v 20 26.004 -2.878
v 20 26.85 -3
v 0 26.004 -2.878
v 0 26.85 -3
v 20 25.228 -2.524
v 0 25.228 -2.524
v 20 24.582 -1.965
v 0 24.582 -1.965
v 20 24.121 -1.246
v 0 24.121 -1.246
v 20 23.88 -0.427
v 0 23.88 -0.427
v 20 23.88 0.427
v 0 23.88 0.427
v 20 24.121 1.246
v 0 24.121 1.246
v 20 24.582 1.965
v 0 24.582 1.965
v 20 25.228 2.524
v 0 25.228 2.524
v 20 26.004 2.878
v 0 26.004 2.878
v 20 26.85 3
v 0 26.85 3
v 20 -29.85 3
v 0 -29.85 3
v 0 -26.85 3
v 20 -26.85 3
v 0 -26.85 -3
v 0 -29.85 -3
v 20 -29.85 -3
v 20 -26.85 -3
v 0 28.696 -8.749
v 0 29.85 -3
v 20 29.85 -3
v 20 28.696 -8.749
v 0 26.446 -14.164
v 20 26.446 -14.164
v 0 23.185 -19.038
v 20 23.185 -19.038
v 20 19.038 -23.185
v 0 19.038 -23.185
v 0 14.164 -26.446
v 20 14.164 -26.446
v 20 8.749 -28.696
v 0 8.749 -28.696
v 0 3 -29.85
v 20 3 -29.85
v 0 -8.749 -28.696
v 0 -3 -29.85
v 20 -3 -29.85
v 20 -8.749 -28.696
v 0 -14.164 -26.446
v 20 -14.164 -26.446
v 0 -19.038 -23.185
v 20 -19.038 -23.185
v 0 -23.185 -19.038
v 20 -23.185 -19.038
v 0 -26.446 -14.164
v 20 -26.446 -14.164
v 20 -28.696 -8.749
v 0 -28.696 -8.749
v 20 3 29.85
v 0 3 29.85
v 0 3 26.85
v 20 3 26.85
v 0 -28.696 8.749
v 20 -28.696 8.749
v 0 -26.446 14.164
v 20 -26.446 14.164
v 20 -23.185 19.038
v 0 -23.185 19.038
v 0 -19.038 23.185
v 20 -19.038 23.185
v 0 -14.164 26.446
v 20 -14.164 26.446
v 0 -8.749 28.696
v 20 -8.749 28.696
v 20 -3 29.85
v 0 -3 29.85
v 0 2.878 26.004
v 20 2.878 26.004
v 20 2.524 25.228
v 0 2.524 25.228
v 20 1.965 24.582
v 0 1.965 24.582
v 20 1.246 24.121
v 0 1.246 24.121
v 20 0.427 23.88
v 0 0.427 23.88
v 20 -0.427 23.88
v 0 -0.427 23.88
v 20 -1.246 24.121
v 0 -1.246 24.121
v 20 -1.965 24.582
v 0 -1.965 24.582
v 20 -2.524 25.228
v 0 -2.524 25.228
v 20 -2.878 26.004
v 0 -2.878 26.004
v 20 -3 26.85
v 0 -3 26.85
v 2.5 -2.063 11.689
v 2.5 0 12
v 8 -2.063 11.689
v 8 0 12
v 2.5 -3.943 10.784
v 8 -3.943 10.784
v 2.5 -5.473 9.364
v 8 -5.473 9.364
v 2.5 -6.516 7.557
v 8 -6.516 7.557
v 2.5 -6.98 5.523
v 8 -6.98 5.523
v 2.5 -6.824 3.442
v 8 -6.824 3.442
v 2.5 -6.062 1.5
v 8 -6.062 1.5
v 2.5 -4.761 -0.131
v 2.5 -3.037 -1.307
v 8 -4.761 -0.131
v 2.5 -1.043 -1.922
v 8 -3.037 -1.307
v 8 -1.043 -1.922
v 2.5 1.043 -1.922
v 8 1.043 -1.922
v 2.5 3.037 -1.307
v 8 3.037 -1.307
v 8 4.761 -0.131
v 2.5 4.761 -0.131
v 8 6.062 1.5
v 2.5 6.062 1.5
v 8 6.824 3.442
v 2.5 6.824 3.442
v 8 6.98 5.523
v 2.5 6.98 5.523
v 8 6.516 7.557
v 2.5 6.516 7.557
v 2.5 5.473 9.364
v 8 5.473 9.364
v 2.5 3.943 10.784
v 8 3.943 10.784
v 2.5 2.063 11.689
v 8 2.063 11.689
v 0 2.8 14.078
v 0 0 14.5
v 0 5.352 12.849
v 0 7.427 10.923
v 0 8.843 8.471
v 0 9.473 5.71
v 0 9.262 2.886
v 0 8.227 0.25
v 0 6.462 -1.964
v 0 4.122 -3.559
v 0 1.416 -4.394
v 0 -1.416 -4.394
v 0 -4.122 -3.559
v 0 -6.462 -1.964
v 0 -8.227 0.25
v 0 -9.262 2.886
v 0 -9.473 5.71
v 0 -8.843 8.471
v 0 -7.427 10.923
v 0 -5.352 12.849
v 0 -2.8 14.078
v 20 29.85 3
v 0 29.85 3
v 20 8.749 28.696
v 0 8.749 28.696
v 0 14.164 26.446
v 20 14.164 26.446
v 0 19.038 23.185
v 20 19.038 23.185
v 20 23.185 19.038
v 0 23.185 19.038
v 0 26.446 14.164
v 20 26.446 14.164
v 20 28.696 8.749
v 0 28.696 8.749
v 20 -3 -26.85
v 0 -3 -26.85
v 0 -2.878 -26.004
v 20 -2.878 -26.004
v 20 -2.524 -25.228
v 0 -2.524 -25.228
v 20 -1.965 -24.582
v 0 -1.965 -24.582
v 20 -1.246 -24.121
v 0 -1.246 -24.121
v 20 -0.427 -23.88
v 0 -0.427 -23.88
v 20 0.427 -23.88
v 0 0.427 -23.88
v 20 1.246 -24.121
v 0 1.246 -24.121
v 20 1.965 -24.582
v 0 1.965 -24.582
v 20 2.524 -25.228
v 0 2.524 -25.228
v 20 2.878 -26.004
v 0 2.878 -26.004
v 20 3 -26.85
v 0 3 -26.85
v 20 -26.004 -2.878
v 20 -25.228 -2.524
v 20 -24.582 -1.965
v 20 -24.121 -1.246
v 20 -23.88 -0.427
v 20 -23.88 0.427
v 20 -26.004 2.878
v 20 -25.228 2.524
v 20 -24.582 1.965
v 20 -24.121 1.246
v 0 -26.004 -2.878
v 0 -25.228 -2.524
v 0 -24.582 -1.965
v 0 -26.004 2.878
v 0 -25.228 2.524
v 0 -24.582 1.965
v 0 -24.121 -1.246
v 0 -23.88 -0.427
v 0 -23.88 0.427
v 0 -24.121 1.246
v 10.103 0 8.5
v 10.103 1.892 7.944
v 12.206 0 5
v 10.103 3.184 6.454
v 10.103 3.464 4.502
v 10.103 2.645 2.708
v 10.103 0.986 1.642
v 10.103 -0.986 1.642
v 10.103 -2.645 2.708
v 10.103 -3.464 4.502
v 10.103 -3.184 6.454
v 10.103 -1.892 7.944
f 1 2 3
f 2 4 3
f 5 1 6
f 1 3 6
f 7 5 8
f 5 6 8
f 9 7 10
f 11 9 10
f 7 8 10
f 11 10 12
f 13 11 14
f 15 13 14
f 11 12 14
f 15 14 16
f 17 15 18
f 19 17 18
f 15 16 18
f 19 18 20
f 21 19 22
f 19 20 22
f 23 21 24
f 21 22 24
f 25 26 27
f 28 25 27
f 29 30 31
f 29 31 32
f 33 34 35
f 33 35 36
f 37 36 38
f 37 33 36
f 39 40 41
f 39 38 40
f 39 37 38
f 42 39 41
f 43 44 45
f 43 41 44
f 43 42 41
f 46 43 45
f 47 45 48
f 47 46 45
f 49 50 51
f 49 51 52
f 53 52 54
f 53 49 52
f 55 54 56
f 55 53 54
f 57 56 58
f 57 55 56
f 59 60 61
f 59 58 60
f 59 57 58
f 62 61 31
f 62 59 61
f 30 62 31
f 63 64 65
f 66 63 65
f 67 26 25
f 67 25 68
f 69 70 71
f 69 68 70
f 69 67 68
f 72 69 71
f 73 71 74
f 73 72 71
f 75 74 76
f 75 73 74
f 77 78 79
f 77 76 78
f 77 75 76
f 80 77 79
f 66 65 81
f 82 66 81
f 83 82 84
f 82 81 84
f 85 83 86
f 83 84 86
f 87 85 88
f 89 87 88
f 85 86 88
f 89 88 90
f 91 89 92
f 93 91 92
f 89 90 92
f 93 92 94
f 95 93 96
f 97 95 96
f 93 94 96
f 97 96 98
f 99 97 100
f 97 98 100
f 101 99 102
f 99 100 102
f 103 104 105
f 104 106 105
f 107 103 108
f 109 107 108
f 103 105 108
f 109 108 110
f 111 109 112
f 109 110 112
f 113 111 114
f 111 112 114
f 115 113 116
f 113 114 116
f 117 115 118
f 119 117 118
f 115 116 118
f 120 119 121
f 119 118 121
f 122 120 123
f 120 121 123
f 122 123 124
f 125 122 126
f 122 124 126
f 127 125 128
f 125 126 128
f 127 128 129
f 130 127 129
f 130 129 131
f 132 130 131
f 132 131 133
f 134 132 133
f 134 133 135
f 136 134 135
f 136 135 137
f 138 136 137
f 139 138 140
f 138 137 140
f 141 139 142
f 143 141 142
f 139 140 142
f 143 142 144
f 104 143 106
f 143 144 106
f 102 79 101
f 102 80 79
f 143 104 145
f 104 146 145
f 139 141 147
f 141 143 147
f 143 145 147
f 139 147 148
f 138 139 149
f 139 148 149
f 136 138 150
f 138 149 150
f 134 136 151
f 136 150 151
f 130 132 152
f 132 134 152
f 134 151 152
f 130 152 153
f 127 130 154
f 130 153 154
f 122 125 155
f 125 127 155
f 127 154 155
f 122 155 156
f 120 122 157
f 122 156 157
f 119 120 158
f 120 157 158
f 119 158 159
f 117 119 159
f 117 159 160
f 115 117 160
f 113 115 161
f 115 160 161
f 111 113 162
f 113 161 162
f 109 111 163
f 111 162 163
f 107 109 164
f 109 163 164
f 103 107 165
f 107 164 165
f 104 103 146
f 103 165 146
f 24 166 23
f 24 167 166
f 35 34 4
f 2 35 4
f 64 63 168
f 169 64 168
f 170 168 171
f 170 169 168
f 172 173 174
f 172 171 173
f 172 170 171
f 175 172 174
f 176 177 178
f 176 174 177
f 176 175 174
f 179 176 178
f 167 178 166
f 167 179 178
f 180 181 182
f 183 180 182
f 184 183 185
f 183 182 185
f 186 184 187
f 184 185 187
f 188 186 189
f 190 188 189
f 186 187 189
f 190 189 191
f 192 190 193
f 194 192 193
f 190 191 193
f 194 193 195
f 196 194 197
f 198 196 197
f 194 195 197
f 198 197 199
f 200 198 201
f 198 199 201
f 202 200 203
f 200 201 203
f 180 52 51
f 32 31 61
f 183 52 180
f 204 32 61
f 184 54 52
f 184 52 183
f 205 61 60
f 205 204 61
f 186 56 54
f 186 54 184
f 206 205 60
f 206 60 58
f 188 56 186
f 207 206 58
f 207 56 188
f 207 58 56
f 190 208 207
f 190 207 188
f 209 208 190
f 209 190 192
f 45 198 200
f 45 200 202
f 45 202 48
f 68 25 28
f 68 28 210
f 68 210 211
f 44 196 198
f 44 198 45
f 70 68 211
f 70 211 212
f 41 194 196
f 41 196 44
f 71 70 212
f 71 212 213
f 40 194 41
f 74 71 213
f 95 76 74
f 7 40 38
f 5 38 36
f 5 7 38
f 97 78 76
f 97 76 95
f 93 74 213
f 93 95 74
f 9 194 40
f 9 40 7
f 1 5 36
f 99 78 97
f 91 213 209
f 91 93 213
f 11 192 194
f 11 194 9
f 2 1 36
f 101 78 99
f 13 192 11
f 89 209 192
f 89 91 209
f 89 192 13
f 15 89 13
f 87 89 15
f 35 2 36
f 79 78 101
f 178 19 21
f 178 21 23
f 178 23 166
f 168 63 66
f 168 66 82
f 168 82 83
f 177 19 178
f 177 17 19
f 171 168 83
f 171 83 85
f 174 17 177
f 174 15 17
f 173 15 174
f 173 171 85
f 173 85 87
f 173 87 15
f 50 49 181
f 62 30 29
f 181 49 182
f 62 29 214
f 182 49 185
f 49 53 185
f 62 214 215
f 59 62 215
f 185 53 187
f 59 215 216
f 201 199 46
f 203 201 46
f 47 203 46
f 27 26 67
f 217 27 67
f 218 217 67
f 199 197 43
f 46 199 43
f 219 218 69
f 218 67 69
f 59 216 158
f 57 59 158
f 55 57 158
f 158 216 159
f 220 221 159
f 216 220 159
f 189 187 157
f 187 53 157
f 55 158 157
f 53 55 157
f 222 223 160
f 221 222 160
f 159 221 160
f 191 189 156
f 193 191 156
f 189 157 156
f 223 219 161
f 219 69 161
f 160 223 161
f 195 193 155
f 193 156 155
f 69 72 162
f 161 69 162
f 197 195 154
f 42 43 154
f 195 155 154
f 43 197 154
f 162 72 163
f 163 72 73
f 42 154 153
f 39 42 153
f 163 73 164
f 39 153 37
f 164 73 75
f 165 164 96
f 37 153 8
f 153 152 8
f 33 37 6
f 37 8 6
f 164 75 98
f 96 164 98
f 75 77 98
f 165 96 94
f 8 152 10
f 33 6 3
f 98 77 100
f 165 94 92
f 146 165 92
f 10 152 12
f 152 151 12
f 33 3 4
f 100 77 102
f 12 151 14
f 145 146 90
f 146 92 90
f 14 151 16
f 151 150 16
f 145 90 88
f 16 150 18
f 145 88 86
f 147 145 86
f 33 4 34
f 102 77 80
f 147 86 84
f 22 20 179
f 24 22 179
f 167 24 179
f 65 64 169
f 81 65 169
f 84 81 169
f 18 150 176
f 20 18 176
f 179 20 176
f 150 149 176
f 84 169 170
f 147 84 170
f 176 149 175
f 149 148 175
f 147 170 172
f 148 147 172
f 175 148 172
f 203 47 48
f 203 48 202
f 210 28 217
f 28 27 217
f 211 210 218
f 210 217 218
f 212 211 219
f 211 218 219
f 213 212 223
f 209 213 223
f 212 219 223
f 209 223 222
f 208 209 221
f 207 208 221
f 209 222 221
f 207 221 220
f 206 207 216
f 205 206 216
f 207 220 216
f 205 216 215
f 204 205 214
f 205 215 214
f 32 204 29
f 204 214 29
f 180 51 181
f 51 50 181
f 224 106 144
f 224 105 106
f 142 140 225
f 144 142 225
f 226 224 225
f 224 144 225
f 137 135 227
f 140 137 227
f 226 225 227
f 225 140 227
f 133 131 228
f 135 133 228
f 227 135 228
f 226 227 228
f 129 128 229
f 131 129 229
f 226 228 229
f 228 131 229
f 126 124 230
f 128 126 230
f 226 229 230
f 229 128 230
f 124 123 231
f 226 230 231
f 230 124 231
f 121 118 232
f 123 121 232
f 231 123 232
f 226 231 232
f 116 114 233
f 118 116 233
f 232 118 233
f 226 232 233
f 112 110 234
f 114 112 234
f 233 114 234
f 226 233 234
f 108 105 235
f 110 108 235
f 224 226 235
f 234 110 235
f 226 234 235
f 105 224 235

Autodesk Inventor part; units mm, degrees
ref_plane "YZ Plane" through (0, 0, 0) normal (1, 0, 0) x (0, 1, 0)
ref_plane "XZ Plane" through (0, 0, 0) normal (0, 1, 0) x (-1, 0, 0)
ref_plane "XY Plane" through (0, 0, 0) normal (0, 0, 1) x (1, 0, 0)
sketch "Эскиз1" plane through (0, 0, 0) normal (0, 0, 1) x (1, 0, 0)
  line L0 (0, 0) -> (20, 0)
  line L1 (20, 0) -> (20, 30)
  line L2 (20, 30) -> (0, 30)
  line L3 (0, 30) -> (0, 0)
  dimension "d0" = 20
  dimension "d1" = 30
revolve "Вращение1" add sketch "Эскиз1" angle 360 about axis through (0, 0, 0) along (1, 0, 0)
sketch "Эскиз2" plane through (0, 0, 0) normal (-1, 0, 0) x (0, 0, 1)
  circle A0 centre (0, 0) radius 30 construction
  circle A1 centre (0, 0) radius 30 projected
  line L0 (-3, 29.8496) -> (-3, 26.8496)
  line L1 (3, 29.8496) -> (3, 26.8496)
  arc A2 (-3, 26.8496) -> (3, 26.8496) centre (0, 26.8496) ccw
  line L2 (-29.8496, -3) -> (-26.8496, -3)
  line L3 (-29.8496, 3) -> (-26.8496, 3)
  arc A3 (-26.8496, -3) -> (-26.8496, 3) centre (-26.8496, 0) ccw
  line L4 (3, -29.8496) -> (3, -26.8496)
  line L5 (-3, -29.8496) -> (-3, -26.8496)
  arc A4 (3, -26.8496) -> (-3, -26.8496) centre (0, -26.8496) ccw
  line L6 (29.8496, 3) -> (26.8496, 3)
  line L7 (29.8496, -3) -> (26.8496, -3)
  arc A5 (26.8496, 3) -> (26.8496, -3) centre (26.8496, 0) ccw
  dimension "d3" = 3
  dimension "d4" = 3
  dimension "d5" = 3
  dimension "d8" = 360
extrude "Выдавливание1" cut sketch "Эскиз2" against normal blind 20 contours A1 L7 A5 L6 | L1 A2 L0 A1 | A1 L5 A4 L4 | L3 A3 L2 A1
sketch "Эскиз3" plane through (0, 0, 26.8496) normal (-1, 0, 0) x (0, 0, 1)
  line L0 (-26.8496, 0) -> (-21.8496, 0) construction
  dimension "d12" = 5
hole "Отверстие1" at (0, 0, 5) direction (1, 0, 0) diameter 14 depth 8 tip angle 118 countersink diameter 19 countersink angle 90
properties part number "711114"
